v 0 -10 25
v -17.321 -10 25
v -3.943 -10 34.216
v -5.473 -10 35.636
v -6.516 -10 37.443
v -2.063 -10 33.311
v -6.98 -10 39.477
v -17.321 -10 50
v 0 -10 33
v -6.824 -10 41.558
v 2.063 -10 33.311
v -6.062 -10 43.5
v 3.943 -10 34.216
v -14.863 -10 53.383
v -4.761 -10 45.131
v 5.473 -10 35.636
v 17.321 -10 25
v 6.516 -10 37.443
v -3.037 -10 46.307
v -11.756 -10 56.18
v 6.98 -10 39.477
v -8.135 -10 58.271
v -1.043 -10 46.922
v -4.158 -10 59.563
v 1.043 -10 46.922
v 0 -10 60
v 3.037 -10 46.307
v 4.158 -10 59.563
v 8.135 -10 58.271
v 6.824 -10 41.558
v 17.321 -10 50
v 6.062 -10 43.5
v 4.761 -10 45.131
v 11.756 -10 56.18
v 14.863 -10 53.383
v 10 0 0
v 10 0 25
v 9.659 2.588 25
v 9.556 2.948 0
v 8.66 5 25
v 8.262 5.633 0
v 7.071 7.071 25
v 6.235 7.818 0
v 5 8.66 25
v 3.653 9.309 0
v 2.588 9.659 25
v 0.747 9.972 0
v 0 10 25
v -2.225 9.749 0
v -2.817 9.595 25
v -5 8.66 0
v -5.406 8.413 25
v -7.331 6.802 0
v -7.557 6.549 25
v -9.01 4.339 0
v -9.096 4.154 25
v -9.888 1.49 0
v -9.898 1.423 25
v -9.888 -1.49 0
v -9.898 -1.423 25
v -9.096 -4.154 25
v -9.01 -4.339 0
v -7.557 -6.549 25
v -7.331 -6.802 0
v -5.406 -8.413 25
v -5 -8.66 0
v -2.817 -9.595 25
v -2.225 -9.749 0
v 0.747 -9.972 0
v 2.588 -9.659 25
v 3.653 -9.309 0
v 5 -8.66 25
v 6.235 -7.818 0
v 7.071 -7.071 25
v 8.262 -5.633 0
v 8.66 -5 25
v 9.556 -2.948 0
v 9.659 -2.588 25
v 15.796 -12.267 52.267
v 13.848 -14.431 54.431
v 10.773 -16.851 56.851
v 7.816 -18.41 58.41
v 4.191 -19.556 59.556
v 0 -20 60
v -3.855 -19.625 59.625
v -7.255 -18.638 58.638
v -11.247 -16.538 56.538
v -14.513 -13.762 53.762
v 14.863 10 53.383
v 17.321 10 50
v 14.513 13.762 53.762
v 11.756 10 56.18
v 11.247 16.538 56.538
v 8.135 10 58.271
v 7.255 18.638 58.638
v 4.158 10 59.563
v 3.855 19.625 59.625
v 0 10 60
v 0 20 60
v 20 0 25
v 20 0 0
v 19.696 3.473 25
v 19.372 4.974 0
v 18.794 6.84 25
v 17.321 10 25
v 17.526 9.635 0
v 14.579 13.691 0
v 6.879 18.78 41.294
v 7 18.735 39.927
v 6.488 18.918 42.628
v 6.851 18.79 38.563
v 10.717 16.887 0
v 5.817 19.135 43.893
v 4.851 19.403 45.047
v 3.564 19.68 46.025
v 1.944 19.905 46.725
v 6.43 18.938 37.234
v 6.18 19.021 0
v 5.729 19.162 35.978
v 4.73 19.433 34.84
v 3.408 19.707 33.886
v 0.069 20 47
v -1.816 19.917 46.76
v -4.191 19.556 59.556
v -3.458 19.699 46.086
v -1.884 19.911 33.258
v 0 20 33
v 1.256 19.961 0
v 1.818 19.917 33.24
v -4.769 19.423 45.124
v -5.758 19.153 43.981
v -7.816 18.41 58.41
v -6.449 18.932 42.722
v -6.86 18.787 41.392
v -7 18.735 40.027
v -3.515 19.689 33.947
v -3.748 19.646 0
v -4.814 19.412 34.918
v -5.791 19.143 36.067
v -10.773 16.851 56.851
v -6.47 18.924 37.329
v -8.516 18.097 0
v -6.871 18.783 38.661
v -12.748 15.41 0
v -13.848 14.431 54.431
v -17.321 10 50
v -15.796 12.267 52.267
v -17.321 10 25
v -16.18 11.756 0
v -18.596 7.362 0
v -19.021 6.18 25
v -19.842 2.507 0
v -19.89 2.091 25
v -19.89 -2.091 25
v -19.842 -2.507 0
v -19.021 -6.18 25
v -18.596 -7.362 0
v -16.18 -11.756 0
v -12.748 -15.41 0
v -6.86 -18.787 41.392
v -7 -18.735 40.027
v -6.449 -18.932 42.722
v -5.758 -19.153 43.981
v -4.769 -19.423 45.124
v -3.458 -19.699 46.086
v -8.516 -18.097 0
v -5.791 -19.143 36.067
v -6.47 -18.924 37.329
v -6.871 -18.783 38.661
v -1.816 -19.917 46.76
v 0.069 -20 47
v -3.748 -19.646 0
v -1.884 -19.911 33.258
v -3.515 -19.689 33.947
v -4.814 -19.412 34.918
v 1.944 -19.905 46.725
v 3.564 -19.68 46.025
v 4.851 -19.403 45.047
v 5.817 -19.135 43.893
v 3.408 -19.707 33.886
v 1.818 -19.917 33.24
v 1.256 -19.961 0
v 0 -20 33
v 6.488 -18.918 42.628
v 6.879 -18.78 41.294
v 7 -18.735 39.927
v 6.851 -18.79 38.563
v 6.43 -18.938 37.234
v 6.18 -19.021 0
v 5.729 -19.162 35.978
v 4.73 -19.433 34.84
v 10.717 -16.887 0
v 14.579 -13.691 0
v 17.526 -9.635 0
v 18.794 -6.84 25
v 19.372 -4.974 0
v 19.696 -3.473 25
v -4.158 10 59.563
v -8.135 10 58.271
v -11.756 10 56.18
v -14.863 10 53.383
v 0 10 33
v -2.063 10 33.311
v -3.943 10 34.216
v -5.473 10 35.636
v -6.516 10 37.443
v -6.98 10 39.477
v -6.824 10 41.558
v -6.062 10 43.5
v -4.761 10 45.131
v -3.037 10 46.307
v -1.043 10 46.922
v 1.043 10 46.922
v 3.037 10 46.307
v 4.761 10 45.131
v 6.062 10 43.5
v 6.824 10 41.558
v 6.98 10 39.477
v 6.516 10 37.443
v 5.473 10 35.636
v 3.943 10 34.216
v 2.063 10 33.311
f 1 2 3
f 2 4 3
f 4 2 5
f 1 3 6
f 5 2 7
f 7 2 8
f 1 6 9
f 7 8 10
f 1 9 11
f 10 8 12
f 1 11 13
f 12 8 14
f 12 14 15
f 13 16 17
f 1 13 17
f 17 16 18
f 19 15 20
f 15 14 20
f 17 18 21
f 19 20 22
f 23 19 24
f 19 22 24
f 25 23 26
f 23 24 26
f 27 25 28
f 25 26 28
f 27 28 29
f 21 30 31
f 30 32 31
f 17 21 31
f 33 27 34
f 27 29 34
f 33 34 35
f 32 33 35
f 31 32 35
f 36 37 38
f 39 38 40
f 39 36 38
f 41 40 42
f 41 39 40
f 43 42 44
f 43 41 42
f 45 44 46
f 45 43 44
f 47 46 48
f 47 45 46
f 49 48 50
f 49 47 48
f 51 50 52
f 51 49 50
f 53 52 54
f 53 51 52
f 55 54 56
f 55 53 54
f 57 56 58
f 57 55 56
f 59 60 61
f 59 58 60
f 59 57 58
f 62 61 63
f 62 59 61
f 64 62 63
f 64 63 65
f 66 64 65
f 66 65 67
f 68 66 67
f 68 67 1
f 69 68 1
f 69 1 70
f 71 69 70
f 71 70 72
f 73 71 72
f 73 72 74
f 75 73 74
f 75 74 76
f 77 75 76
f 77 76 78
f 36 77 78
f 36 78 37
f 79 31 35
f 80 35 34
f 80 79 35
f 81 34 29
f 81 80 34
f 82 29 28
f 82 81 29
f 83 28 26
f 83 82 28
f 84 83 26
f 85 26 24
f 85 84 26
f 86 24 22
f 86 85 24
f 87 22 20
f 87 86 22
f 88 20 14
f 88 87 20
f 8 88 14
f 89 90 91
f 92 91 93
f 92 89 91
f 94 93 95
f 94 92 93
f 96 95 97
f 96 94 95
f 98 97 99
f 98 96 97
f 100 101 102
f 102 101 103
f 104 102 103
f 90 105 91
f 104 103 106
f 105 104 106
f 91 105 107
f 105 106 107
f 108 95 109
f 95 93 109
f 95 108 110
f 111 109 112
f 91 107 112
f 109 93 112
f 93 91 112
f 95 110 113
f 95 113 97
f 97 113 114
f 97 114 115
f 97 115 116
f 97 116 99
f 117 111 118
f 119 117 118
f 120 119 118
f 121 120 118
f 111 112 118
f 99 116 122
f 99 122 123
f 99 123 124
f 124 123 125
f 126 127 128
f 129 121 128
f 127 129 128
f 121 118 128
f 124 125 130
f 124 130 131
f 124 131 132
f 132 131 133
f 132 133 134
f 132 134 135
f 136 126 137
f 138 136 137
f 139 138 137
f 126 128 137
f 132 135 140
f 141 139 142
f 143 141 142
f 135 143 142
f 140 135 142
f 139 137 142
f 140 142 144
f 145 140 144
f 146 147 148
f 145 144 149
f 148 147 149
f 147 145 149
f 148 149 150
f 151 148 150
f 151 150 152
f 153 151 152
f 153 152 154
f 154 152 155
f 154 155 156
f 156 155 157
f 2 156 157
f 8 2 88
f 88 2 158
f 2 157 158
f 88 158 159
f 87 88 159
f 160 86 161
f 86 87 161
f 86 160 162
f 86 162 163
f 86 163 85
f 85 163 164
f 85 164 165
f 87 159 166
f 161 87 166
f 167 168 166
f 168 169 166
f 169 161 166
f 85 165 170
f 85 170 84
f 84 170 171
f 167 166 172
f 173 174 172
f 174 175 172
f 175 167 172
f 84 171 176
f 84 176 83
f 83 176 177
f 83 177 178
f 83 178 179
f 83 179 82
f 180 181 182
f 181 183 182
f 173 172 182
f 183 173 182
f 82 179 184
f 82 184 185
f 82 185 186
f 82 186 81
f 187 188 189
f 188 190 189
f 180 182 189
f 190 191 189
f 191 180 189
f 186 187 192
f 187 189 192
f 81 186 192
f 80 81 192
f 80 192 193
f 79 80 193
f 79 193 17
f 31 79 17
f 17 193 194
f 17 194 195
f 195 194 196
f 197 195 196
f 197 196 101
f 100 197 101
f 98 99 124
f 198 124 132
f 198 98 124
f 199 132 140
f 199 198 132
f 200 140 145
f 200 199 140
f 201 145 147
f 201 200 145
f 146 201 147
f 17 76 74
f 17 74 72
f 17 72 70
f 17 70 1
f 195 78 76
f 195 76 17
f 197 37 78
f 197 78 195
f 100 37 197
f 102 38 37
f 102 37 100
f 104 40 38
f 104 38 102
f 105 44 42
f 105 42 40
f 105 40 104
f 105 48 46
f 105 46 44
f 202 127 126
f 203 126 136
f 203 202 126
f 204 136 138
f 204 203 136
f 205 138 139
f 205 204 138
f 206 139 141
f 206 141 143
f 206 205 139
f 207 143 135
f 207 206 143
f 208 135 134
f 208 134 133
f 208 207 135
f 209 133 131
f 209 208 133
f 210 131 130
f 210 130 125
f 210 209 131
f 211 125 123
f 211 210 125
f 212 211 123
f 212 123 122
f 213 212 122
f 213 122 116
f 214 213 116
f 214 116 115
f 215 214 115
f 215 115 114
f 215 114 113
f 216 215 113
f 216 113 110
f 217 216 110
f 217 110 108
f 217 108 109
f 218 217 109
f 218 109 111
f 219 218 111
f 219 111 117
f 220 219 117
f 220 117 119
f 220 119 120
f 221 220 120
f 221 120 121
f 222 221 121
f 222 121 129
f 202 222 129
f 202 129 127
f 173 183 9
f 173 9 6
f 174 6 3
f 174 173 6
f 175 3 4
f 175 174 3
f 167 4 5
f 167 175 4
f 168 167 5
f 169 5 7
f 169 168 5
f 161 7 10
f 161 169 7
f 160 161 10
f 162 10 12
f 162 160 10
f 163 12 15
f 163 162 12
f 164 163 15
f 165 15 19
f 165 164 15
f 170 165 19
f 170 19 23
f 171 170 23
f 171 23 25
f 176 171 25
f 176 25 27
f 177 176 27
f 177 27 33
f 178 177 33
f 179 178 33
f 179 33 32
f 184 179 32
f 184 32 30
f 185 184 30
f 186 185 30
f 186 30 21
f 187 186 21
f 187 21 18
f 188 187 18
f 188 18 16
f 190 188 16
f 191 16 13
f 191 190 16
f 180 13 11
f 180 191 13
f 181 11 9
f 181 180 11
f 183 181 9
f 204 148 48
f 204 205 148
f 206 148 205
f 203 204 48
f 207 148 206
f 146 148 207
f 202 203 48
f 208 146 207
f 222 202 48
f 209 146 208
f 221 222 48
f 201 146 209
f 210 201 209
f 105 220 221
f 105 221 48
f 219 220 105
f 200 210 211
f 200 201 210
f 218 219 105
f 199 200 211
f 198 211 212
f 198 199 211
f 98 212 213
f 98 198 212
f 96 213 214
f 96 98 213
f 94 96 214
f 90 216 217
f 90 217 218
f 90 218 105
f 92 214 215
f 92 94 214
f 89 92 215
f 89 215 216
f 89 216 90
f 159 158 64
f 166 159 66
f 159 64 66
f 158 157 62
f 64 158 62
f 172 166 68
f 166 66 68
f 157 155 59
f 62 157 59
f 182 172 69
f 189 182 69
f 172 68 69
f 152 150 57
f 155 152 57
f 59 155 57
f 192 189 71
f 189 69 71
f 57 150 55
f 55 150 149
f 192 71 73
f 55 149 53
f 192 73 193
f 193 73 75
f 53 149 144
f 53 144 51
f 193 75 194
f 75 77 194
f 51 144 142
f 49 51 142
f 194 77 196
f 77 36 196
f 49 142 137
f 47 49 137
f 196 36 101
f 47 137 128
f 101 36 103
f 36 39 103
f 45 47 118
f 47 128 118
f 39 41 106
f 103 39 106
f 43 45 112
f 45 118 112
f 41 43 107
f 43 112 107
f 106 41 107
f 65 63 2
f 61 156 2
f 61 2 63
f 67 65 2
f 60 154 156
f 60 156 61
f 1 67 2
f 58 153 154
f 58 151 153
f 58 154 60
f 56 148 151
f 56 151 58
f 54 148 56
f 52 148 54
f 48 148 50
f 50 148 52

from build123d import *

# Parameters (mm, degrees)
SZKIC1_R                        = 20
SZKIC1_R_2                      = 10
DODANIE_WYCI_GNI_CIE1_DEPTH     = 60
WYTNIJ_WYCI_GNI_CIE1_DEPTH      = 60
WYTNIJ_WYCI_GNI_CIE1_DEPTH_BACK = 60
SZKIC2_R                        = 7
SZKIC3_W                        = 43.38895033
SZKIC3_H                        = 20
WYTNIJ_WYCI_GNI_CIE2_DEPTH      = 35


with BuildPart() as part:
    # Szkic1 → Dodanie-wyciągnięcie1 (new body)
    with BuildSketch(Plane.XY):
        Circle(SZKIC1_R)
        Circle(SZKIC1_R_2, mode=Mode.SUBTRACT)
    extrude(amount=DODANIE_WYCI_GNI_CIE1_DEPTH)

    # Szkic2 → Wytnij-wyciągnięcie1 (cut, two sides: drawn at the far end of the back side and taken through both)
    with BuildSketch(Plane(origin=(0, 0, 0), x_dir=(1, 0, 0), z_dir=(0, 1, 0)).offset(-WYTNIJ_WYCI_GNI_CIE1_DEPTH_BACK)):
        with BuildLine():
            ThreePointArc((0, -60), (-14.142135624, -54.142135624), (-20, -40))
            Line((-20, -40), (-20, -60))
            Line((-20, -60), (0, -60))
        make_face()
        with BuildLine():
            Line((20, -60), (20, -40))
            ThreePointArc((20, -40), (14.142135624, -54.142135624), (0, -60))
            Line((0, -60), (20, -60))
        make_face()
        with Locations((0, -40)):
            Circle(SZKIC2_R)
    extrude(amount=WYTNIJ_WYCI_GNI_CIE1_DEPTH + WYTNIJ_WYCI_GNI_CIE1_DEPTH_BACK, mode=Mode.SUBTRACT)

    # Szkic3 → Wytnij-wyciągnięcie2 (cut)
    with BuildSketch(Plane.XY.offset(60)):
        Rectangle(SZKIC3_W, SZKIC3_H)
    extrude(amount=-WYTNIJ_WYCI_GNI_CIE2_DEPTH, mode=Mode.SUBTRACT)


solid = part.part
